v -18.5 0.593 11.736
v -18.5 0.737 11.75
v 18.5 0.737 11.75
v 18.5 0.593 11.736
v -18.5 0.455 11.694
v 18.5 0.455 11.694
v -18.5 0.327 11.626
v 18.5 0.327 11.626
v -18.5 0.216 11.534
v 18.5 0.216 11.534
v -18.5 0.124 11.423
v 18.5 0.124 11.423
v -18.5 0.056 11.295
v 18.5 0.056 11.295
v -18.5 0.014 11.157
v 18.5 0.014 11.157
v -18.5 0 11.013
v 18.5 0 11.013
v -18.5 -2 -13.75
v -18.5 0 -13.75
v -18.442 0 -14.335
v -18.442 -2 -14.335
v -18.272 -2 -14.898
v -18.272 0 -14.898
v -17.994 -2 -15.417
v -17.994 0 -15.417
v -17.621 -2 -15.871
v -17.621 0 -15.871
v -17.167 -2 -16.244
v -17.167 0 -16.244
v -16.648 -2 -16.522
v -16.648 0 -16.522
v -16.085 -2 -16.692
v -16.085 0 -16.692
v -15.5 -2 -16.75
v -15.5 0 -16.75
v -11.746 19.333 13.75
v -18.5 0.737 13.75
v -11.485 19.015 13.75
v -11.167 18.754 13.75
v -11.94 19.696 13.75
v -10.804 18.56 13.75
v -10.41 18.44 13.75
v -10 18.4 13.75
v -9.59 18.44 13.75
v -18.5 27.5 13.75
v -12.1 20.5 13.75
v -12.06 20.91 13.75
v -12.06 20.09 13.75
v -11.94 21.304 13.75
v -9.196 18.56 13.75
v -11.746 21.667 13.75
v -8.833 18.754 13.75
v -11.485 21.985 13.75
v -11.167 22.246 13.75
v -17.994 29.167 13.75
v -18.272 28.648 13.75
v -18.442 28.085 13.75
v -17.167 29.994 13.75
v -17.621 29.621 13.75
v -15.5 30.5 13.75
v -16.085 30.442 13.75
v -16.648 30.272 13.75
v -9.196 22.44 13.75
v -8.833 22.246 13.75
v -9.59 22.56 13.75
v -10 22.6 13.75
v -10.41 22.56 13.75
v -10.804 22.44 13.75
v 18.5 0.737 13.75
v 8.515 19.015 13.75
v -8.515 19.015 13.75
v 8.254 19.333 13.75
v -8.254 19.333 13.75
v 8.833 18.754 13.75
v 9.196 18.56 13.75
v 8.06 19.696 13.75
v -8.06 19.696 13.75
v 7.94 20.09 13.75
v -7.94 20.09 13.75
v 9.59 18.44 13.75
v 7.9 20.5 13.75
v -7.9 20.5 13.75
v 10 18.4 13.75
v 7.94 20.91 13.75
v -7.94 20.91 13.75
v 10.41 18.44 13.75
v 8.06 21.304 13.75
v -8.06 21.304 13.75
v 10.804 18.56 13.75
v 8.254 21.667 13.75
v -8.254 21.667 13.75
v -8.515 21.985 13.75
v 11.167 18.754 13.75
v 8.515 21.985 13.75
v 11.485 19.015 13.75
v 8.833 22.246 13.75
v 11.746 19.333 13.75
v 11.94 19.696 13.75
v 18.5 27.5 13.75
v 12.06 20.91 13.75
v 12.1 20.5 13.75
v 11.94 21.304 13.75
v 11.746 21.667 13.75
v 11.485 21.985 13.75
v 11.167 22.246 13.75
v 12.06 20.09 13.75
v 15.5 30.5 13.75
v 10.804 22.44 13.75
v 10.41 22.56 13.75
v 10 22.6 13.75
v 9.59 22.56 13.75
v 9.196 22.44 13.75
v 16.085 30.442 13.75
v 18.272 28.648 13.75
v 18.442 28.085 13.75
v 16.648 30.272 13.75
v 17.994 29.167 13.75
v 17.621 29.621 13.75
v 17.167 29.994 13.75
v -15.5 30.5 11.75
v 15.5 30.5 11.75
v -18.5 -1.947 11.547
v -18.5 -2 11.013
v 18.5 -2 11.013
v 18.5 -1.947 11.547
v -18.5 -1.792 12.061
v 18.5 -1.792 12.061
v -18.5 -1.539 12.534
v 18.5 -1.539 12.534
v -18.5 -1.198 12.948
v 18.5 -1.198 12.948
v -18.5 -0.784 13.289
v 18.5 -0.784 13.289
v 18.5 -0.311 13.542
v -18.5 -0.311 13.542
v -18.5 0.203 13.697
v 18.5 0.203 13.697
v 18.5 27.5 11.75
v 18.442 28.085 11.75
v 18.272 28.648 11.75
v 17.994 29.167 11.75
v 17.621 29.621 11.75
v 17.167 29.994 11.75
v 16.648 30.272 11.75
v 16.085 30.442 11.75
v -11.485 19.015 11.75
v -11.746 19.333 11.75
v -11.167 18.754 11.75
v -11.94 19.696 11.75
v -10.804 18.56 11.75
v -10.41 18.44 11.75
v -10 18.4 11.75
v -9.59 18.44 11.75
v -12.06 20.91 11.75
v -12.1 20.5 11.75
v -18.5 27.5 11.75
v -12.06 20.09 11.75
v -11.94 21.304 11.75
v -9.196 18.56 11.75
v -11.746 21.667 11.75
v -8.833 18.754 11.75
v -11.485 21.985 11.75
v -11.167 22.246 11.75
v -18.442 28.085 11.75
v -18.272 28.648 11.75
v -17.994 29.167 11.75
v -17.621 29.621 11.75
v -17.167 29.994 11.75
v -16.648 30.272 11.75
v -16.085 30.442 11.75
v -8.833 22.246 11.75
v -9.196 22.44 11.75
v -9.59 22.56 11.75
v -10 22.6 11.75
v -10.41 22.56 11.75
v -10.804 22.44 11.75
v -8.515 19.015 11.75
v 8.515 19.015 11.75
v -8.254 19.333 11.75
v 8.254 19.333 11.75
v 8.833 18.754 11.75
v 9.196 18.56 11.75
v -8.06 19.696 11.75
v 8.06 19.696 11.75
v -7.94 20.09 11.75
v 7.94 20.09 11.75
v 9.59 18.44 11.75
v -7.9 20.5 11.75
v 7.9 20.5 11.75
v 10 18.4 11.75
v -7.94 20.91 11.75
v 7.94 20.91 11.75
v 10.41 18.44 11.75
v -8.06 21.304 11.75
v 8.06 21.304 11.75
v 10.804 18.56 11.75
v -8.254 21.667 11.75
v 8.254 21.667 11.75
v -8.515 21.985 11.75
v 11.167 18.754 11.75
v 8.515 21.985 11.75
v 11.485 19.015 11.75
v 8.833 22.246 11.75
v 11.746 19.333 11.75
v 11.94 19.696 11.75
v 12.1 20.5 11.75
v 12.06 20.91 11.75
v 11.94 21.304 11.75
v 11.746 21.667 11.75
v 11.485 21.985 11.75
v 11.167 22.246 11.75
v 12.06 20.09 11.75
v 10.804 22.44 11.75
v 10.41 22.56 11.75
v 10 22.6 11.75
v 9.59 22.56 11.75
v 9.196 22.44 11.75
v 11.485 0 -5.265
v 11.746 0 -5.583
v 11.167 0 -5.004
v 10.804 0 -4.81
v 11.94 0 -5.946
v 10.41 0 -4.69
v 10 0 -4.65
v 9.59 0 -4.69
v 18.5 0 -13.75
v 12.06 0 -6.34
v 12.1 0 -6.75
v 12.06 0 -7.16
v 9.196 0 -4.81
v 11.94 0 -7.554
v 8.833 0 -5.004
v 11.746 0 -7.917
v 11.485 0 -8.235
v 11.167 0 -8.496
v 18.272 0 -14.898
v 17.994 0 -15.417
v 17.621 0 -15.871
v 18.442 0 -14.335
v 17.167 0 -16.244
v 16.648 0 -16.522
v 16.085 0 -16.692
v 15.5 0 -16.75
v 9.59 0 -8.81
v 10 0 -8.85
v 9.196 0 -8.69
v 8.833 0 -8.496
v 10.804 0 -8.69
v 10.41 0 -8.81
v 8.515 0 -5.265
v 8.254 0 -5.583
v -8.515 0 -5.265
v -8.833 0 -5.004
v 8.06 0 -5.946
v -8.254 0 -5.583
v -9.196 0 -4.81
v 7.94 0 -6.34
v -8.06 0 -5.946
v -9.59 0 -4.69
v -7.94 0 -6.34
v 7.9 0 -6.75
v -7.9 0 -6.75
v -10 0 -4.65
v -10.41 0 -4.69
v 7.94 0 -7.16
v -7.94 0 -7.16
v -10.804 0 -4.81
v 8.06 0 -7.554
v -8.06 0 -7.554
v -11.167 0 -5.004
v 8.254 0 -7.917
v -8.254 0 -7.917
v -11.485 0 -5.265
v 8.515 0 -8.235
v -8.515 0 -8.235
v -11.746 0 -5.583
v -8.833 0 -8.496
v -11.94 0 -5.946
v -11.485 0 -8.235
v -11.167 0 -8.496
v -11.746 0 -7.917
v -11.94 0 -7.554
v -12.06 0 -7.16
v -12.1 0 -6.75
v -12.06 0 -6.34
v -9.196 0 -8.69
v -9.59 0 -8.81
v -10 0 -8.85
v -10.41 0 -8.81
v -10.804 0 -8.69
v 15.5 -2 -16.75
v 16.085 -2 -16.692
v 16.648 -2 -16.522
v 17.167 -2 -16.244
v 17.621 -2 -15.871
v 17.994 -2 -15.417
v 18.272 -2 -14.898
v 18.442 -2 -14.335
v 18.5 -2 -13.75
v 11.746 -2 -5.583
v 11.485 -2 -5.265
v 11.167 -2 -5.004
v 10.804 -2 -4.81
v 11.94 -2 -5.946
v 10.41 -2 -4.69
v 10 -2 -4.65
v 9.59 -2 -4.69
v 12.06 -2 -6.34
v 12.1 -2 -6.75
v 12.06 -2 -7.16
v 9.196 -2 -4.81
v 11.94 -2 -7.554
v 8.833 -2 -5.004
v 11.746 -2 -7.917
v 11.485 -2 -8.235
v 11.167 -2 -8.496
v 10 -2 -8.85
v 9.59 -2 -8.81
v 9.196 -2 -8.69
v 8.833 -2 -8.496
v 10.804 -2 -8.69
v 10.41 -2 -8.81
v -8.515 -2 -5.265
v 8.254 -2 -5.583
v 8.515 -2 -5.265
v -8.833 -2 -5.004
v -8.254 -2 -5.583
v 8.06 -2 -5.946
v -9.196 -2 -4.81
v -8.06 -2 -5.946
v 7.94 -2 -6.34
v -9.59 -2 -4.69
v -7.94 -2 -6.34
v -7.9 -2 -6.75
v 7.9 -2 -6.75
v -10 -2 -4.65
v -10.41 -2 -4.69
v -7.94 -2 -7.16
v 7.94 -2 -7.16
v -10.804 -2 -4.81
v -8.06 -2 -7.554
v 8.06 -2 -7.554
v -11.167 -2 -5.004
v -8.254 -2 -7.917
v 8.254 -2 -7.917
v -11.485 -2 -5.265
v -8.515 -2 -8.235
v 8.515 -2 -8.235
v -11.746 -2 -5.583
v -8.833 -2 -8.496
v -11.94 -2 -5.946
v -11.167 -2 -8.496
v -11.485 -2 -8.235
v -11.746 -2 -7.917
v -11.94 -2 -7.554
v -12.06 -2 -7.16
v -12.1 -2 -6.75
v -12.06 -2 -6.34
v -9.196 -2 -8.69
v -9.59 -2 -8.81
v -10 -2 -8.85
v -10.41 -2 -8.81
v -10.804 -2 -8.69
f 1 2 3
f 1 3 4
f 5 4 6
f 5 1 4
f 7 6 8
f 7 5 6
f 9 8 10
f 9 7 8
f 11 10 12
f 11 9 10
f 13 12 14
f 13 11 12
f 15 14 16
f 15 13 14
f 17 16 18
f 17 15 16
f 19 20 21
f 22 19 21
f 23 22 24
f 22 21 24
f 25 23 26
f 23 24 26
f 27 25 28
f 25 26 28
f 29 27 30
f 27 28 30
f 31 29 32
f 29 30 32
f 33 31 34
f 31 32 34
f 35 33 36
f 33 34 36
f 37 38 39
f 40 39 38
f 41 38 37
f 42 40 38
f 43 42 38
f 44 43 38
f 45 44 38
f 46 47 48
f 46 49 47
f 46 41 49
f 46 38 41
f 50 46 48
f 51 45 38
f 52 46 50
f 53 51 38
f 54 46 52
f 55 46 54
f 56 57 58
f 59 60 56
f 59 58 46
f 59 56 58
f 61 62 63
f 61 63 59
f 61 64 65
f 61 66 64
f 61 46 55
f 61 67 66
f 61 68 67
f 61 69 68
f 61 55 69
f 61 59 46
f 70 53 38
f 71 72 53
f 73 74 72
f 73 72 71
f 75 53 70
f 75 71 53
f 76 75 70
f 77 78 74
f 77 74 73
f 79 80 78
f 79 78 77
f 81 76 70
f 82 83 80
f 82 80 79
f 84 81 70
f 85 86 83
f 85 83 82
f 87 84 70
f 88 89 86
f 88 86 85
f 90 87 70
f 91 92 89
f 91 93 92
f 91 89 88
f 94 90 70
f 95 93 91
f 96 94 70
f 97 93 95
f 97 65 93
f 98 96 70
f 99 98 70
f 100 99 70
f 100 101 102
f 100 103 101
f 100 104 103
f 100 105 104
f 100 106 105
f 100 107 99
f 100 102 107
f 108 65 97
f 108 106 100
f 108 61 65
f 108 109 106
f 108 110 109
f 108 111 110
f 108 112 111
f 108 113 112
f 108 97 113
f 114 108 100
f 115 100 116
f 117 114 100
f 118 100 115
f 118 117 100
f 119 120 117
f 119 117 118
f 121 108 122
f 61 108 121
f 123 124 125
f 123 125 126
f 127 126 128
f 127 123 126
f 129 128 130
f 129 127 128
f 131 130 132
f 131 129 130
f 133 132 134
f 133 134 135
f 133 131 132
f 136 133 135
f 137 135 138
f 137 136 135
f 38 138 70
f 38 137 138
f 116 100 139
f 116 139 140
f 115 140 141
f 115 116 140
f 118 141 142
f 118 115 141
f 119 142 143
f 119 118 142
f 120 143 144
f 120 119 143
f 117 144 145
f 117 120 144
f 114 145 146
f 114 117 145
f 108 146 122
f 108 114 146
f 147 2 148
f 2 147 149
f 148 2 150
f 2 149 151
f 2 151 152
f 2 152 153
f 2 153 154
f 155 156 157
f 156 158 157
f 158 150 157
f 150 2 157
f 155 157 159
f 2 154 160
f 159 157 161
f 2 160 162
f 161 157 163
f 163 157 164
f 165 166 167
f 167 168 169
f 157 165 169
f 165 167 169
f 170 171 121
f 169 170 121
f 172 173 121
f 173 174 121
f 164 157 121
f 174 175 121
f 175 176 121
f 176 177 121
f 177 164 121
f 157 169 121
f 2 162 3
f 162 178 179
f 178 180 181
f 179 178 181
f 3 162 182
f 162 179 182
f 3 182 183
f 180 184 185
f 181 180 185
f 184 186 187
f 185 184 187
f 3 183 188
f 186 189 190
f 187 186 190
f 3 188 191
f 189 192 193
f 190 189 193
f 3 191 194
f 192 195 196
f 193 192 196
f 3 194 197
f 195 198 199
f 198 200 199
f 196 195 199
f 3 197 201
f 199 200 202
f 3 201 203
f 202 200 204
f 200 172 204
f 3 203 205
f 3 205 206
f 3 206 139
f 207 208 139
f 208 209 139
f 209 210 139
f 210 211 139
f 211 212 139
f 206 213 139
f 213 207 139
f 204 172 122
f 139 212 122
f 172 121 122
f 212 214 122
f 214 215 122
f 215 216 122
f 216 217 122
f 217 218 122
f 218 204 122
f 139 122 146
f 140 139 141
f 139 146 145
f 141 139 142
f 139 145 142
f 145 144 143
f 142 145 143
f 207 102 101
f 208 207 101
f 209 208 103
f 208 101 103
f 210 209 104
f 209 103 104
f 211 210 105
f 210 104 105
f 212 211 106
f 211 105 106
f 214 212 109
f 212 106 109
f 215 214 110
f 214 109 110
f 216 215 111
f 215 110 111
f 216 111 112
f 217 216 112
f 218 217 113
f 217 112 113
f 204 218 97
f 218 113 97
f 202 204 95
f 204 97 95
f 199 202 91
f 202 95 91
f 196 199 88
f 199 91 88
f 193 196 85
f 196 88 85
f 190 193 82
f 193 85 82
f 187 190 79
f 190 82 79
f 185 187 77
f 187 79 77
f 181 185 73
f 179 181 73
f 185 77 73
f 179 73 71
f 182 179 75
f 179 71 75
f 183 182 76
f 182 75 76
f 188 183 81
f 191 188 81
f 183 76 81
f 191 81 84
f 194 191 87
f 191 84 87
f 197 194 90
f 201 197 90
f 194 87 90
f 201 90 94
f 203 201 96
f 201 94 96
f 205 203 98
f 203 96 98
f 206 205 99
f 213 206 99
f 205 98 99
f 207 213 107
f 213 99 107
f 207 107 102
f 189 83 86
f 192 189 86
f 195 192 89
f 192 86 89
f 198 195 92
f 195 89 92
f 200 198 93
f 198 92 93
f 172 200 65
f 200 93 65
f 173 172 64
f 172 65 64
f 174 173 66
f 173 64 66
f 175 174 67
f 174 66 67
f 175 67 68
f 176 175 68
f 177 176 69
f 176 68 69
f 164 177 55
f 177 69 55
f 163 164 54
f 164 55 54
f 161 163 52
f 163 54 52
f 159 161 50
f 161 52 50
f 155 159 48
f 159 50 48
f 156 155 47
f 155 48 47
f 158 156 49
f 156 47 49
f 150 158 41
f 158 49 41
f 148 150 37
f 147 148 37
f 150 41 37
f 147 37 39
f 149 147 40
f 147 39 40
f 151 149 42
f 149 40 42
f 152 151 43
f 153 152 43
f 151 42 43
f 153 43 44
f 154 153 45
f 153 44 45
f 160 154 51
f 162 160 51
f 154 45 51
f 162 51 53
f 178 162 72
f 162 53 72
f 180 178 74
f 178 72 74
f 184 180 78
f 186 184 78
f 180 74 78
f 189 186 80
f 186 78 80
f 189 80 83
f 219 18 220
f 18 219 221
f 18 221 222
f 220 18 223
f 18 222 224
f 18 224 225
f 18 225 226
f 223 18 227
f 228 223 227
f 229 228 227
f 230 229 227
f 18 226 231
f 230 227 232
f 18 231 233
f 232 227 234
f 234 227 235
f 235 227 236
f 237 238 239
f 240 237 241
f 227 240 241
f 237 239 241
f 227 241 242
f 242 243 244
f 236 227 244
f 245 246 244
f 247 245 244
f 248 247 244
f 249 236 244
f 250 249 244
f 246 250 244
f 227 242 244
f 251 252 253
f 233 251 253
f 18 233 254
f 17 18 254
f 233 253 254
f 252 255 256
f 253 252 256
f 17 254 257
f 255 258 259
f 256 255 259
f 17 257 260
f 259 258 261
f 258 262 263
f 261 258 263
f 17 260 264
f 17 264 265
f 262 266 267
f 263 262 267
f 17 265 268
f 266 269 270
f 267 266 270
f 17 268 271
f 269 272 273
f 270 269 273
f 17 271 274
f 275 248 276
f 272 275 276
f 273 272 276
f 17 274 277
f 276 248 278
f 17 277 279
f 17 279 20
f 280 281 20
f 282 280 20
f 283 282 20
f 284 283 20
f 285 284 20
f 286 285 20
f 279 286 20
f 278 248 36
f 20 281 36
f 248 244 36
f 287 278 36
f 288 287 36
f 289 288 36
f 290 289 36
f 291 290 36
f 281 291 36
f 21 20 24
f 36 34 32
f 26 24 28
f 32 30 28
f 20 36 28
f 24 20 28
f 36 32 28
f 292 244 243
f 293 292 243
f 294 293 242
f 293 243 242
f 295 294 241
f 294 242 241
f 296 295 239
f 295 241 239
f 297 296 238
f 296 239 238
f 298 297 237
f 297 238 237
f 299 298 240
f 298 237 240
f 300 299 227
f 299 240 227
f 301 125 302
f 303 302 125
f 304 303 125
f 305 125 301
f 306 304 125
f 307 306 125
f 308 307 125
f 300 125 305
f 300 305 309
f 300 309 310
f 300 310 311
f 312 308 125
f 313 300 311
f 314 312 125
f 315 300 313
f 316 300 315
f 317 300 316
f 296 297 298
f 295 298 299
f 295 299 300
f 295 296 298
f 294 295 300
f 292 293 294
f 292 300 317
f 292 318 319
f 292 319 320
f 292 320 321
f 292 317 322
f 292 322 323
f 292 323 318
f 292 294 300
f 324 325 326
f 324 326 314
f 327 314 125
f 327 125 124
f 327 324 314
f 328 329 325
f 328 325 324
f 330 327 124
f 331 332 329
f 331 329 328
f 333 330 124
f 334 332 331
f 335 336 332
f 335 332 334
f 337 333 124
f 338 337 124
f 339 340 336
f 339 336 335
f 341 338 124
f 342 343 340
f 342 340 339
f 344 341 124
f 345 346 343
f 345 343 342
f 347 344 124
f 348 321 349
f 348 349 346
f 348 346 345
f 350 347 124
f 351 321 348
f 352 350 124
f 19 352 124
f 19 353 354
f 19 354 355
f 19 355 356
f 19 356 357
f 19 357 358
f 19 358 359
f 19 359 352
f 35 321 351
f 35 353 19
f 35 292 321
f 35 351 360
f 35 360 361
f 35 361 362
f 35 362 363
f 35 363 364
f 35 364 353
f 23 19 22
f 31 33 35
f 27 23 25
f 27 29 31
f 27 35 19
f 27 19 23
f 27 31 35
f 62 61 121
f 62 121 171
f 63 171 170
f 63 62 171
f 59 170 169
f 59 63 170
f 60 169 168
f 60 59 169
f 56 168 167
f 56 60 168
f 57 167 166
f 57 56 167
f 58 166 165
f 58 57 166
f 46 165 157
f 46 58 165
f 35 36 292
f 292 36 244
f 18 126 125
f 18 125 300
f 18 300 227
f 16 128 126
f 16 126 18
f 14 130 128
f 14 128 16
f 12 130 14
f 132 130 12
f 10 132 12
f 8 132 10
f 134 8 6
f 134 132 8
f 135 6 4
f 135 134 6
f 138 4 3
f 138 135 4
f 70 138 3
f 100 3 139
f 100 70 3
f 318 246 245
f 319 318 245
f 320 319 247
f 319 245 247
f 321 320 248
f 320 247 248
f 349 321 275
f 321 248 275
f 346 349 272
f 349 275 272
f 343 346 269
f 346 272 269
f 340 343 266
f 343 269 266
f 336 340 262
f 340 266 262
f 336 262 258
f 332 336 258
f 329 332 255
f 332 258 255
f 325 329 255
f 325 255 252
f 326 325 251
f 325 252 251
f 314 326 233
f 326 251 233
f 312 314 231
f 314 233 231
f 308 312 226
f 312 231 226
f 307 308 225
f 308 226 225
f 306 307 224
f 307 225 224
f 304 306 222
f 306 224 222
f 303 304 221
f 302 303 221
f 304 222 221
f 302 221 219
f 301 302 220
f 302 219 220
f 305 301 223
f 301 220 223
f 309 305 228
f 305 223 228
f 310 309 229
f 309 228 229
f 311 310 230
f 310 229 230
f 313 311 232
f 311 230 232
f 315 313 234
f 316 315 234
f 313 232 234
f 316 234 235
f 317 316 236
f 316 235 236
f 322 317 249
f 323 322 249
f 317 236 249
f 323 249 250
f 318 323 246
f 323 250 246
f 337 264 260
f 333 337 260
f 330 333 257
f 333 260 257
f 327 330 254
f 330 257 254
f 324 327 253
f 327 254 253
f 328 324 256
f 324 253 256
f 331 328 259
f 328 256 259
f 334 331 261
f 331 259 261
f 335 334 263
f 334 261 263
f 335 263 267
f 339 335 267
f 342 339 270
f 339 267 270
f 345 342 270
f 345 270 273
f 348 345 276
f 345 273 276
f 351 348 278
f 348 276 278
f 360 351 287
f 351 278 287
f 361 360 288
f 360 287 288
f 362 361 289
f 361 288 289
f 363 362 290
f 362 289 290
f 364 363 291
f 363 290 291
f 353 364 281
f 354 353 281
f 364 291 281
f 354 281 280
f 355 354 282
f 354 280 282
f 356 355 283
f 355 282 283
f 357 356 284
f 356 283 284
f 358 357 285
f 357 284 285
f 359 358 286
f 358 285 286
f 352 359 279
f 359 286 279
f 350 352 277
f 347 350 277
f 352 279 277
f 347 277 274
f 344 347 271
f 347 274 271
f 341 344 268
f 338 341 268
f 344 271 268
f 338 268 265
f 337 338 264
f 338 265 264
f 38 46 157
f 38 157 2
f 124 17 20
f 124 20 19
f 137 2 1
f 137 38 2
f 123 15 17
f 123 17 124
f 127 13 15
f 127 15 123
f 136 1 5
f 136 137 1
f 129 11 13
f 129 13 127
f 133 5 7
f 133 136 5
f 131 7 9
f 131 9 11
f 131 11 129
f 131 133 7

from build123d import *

# Parameters (mm, degrees)
SKETCH_1_R                       = 2.1
SM_BASE_FLANGE_1_DEPTH           = 2
SM_EDGE_FLANGE_1_STRIP_W         = 9.4732
SM_EDGE_FLANGE_1_STRIP_H         = 2
SM_EDGE_FLANGE_1_STRIP_CUT_DEPTH = 37
SM_EDGE_FLANGE_1_DEPTH           = 37
SM_EDGE_FLANGE_1_PROFILE_R       = 2.1
SM_EDGE_FLANGE_1_FLAT_DEPTH      = 2


# Sheet-metal steps are written as plain solids
with BuildPart() as part:
    # Sketch 1 → 基体-法兰1 (new body)
    with BuildSketch(Plane(origin=(0, 0, 0), x_dir=(1, 0, 0), z_dir=(0, 1, 0))):
        with BuildLine():
            Line((-15.5, 16.75), (15.5, 16.75))
            ThreePointArc((15.5, 16.75), (17.621320344, 15.871320344), (18.5, 13.75))
            Line((18.5, 13.75), (18.5, -13.75))
            Line((18.5, -13.75), (-18.5, -13.75))
            Line((-18.5, -13.75), (-18.5, 13.75))
            ThreePointArc((-18.5, 13.75), (-17.621320344, 15.871320344), (-15.5, 16.75))
        make_face()
        with Locations(Location((-10, 6.75, 0), (0, 0, 270))):
            Circle(SKETCH_1_R, mode=Mode.SUBTRACT)
        with Locations(Location((10, 6.75, 0), (0, 0, 90))):
            Circle(SKETCH_1_R, mode=Mode.SUBTRACT)
    extrude(amount=-SM_BASE_FLANGE_1_DEPTH)

    # 边线-法兰1 strip (across the edge) → 边线-法兰1 strip cut (cut)
    with BuildSketch(Plane(origin=(-18.5, 0, 13.75), x_dir=(0, 0, -1), z_dir=(1, 0, 0))):
        with Locations((-2, -1)):
            Rectangle(SM_EDGE_FLANGE_1_STRIP_W, SM_EDGE_FLANGE_1_STRIP_H)
    extrude(amount=SM_EDGE_FLANGE_1_STRIP_CUT_DEPTH, mode=Mode.SUBTRACT)

    # 边线-法兰1 bend section (across the edge) → 边线-法兰1 (add)
    with BuildSketch(Plane(origin=(-18.5, 0, 13.75), x_dir=(0, 0, -1), z_dir=(1, 0, 0))):
        with BuildLine():
            Line((0, 0.7366), (2, 0.7366))
            ThreePointArc((2, 0.7366), (2.215745145, 0.215745145), (2.7366, 0))
            Line((2.7366, 0), (2.7366, -2))
            ThreePointArc((2.7366, -2), (0.801531583, -1.198468417), (0, 0.7366))
        make_face()
    extrude(amount=SM_EDGE_FLANGE_1_DEPTH)

    # 边线-法兰1 profile (on flange) → 边线-法兰1 flat (add)
    with BuildSketch(Plane.XY.offset(13.75)):
        with BuildLine():
            Line((-18.5, 27.5), (-18.5, 0.7366))
            Line((-18.5, 0.7366), (18.5, 0.7366))
            Line((18.5, 0.7366), (18.5, 27.5))
            ThreePointArc((18.5, 27.5), (17.621320344, 29.621320344), (15.5, 30.5))
            Line((15.5, 30.5), (-15.5, 30.5))
            ThreePointArc((-15.5, 30.5), (-17.621320344, 29.621320344), (-18.5, 27.5))
        make_face()
        with Locations((-10, 20.5)):
            Circle(SM_EDGE_FLANGE_1_PROFILE_R, mode=Mode.SUBTRACT)
        with Locations((10, 20.5)):
            Circle(SM_EDGE_FLANGE_1_PROFILE_R, mode=Mode.SUBTRACT)
    extrude(amount=-SM_EDGE_FLANGE_1_FLAT_DEPTH)


solid = part.part
